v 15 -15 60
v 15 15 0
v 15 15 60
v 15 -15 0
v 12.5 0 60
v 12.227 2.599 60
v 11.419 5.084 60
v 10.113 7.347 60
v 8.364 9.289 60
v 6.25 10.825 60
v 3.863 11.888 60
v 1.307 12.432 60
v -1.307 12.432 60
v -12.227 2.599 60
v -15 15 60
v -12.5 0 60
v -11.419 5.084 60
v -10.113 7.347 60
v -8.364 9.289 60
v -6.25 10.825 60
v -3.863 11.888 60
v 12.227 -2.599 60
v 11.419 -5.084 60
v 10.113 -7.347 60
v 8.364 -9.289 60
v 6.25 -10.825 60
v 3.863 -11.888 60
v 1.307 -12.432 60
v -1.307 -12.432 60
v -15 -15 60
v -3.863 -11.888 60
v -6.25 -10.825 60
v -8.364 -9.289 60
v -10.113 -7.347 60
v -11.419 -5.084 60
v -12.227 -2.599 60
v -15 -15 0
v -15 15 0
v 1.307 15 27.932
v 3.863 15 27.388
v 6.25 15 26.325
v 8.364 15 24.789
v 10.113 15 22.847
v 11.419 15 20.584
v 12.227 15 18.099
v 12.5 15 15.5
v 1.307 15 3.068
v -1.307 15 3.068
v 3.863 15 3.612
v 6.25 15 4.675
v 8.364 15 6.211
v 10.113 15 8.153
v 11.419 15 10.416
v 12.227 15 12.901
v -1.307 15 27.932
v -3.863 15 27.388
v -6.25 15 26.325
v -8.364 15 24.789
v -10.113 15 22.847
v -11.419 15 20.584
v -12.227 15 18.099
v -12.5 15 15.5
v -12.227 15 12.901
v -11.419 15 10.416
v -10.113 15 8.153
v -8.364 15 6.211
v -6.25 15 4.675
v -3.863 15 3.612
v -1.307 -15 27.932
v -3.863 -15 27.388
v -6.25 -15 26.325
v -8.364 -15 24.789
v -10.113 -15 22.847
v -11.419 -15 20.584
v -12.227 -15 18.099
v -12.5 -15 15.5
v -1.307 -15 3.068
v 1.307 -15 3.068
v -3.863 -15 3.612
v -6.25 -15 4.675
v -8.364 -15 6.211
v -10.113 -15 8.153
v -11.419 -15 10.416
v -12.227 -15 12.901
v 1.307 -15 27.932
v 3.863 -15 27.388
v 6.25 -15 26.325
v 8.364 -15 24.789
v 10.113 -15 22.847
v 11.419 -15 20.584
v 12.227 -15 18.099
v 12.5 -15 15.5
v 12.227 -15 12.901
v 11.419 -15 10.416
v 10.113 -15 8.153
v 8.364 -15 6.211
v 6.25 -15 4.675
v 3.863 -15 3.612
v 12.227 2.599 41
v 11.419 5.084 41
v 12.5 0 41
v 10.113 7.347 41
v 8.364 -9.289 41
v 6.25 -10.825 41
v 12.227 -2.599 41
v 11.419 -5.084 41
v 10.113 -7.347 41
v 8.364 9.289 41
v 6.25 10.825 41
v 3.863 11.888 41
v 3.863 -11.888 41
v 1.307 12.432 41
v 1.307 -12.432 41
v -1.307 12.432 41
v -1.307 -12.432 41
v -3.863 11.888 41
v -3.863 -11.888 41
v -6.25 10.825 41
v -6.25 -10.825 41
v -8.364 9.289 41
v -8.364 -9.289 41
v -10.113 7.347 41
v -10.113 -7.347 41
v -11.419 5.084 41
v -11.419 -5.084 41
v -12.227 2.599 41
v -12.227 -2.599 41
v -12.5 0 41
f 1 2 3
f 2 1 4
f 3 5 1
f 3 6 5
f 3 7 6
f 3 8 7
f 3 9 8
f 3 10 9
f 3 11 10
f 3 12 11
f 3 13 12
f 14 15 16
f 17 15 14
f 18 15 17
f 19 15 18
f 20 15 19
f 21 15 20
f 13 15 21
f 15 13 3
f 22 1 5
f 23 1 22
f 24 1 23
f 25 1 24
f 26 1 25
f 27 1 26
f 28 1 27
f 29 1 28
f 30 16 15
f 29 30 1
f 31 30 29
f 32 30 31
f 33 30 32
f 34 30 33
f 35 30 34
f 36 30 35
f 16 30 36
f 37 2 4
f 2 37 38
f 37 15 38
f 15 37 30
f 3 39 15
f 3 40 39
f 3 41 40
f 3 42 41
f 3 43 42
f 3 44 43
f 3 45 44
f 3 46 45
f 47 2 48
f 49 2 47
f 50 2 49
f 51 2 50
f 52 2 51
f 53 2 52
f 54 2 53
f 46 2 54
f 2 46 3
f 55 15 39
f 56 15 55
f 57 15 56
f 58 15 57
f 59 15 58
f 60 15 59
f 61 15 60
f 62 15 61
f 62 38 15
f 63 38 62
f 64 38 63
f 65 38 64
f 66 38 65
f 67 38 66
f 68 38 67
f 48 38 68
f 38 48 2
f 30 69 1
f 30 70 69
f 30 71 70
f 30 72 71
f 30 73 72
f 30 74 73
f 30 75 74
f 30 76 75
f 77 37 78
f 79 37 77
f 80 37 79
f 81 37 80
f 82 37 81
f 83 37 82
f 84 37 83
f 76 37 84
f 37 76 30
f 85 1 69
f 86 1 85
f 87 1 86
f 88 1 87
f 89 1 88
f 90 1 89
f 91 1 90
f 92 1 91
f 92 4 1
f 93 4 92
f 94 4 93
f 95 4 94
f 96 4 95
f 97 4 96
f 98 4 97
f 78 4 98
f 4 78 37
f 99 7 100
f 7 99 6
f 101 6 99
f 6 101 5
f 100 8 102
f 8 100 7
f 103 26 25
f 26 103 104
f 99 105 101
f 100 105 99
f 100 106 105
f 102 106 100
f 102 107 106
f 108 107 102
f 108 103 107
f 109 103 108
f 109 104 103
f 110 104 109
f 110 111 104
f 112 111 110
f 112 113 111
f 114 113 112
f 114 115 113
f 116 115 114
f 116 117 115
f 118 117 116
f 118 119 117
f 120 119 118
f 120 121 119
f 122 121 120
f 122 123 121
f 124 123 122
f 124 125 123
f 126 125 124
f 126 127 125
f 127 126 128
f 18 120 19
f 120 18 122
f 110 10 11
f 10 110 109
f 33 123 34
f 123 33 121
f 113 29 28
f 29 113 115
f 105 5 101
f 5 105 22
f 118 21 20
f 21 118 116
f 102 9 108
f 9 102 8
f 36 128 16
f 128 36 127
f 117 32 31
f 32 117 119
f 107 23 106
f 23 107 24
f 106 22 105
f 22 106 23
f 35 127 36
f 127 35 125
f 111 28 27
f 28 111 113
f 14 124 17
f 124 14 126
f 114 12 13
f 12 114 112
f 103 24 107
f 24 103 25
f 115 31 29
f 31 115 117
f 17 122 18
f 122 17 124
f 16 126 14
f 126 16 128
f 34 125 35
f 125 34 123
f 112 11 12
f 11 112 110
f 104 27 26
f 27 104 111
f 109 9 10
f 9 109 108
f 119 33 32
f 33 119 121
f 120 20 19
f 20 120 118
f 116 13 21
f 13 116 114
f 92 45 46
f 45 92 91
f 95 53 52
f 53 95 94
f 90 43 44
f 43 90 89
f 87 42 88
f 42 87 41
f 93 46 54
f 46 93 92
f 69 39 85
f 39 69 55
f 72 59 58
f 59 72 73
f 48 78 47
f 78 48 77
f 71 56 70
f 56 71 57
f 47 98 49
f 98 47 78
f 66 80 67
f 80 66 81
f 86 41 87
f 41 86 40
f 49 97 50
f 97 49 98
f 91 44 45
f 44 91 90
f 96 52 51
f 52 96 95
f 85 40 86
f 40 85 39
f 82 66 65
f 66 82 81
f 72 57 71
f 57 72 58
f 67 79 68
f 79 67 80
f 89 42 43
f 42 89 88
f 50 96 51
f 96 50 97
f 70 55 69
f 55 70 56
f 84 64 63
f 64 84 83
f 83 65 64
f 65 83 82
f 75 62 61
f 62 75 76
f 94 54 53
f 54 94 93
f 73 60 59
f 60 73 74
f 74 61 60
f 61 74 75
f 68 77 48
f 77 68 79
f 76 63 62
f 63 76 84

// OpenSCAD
// Solar-Bear
// A solar-hybrid trike
// https://github.com/solar-b

// Maker: Mihai Oltean
// https://mihaioltean.github.io
// License: MIT

// last update 2026.09.21
//---------------------------------------------------------------------------------------
module pipe_50_20_2(length)
{
    translate([-25, -10, 0])
        difference(){
            color("DarkSlateGray")
                cube([50, 20, length]);
            translate([2, 2, -2])
            color("DarkSlateGray")
                cube([46, 16, length + 4]);
        }
}
//---------------------------------------------------------------------------------------
module pipe_40_20_2(length)
{
    translate([-20, -10, 0])
        difference(){
            color("DarkSlateGray")
                cube([40, 20, length]);
            translate([2, 2, -2])
            color("DarkSlateGray")
                cube([36, 16, length + 4]);
        }
}
//---------------------------------------------------------------------------------------
module pipe_40_10_1_5(length)
{
    translate([-20, -5, 0])
        difference(){
            color("DarkSlateGray")
                cube([40, 10, length]);
            translate([2, 2, -2])
            color("DarkSlateGray")
                cube([36, 7, length + 4]);
        }
}
//---------------------------------------------------------------------------------------
module pipe_30_20_2(length)
{
    translate([-15, -10, 0])
        difference(){
            color("DarkSlateGray")
                cube([30, 20, length]);
            translate([2, 2, -2])
            color("DarkSlateGray")
                cube([26, 16, length + 4]);
        }
}
//---------------------------------------------------------------------------------------
module pipe_20_20_2(length)
{
    translate([-10, -10, 0])
        difference(){
            color("DarkSlateGray")
                cube([20, 20, length]);
            translate([2, 2, -2])
            color("DarkSlateGray")
                cube([16, 16, length + 4]);
        }
}
//---------------------------------------------------------------------------------------
module pipe_15_15_1_5(length)
{
    translate([-7.5, -7.5, 0])
        difference(){
            color("DarkSlateGray")
                cube([15, 15, length]);
            translate([1.5, 1.5, -2])
            color("DarkSlateGray")
                cube([12, 12, length + 4]);
        }
}
//---------------------------------------------------------------------------------------
module pipe_30_30_2(length)
{
    translate([-15, -15, 0])
        difference(){
            color("DarkSlateGray")
                cube([30, 30, length]);
            translate([2, 2, -2])
            color("DarkSlateGray")
                cube([26, 26, length + 4]);
        }
}
//---------------------------------------------------------------------------------------
module pipe_40_40_2(length)
{
    translate([-20, -20, 0])
        difference(){
            color("DarkSlateGray") cube([40, 40, length]);
            translate([2, 2, -2])
            color("DarkSlateGray")
                cube([36, 36, length + 4]);
        }
}
//---------------------------------------------------------------------------------------
module pipe_40_30_2(length)
{
    translate([-20, -15, 0])
        difference(){
            color("DarkSlateGray") cube([40, 30, length]);
            translate([2, 2, -2])
            color("DarkSlateGray")
                cube([36, 26, length + 4]);
        }
}
//---------------------------------------------------------------------------------------
module cylinder_1_2(length) // 1/2 inches
{
    difference(){
        color("DarkSlateGray")
            cylinder(h= length, r = 10.6);
        translate([0, 0, -2])
        color("DarkSlateGray")
        cylinder(h= length + 4, r = 8.6);
    }
}
//---------------------------------------------------------------------------------------
module corner_30_30_3(length)
{
    difference(){
        color("DarkSlateGray")
            cube([30, length, 30]);
        translate([3, -3, 3])
            color("DarkSlateGray")
                cube([28, length + 6, 28]);
    }
}
//---------------------------------------------------------------------------------------
module corner_30_23_3(length)
{
    difference(){
        color("DarkSlateGray")
            cube([30, length, 23]);
        translate([3, -3, 3])
            color("DarkSlateGray")
                cube([28, length + 6, 21]);
    }
}
//---------------------------------------------------------------------------------------
module corner_23_30_3(length)
{
    difference(){
        color("DarkSlateGray")
            cube([23, length, 30]);
        translate([3, -3, 3])
            color("DarkSlateGray")
                cube([24, length + 6, 28]);
    }
}
//---------------------------------------------------------------------------------------
module corner_25_25_3(length)
{
    difference(){
        color("DarkSlateGray")
            cube([25, length, 25]);
        translate([3, -3, 3])
            color("DarkSlateGray")
                cube([23, length + 6, 23]);
    }
}
//---------------------------------------------------------------------------------------
module corner_40_30_3(length)
{
    difference(){
        color("DarkSlateGray")
            cube([40, length, 30]);
        translate([3, -3, 3])
            color("DarkSlateGray")
                cube([38, length + 6, 28]);
    }
}
//---------------------------------------------------------------------------------------
module corner_40_40_4(length)
{
    difference(){
        color("DarkSlateGray")
            cube([length, 40, 40]);
        translate([-2, 4, 4])
            color("DarkSlateGray")
                cube([length + 4, 40, 40]);
    }
}
//---------------------------------------------------------------------------------------
module corner_angled_40_40_4(length, angle = 90)
{
    color("DarkSlateGray"){
        cube([length, 4, 40]);
        translate([0, 0, 4])
            rotate([-angle, 0, 0])
                cube([length, 4, 40]);
    }
}
//---------------------------------------------------------------------------------------
module T_40_5(length)
{
    difference(){
        color("DarkSlateGray")
            translate([0, -20, 0])
                cube([length, 40, 40]);
                
        translate([-2, -21, 5])
            color("DarkSlateGray")
                cube([length + 4, 18.5, 38]);
                
        translate([-2, 2.5, 5])
            color("DarkSlateGray")
                cube([length + 4, 18.5, 38]);
    }
}
//---------------------------------------------------------------------------------------
module tube(h, r_ext, r_int)
{
    difference(){
        cylinder(h = h, r = r_ext);
        translate([0, 0, -1])
            cylinder(h = h + 2, r = r_int);
    }
}
//---------------------------------------------------------------------------------------
module pipe_connector_25(length)
{// pipe connector, fi 25mm
    difference(){
        translate([-15, -15, 0])
            cube([30, 30, length]);
        translate([0, 0, length - 19])
            cylinder(h = 20, r = 12.5);
        translate([0, 16, 3 + 12.5])
            rotate([90, 0, 0])
                cylinder(h = 32, r = 12.5);
    }
}
//---------------------------------------------------------------------------------------


//corner_50_50_5(100);
//corner_23_30_3(100);

//corner_angled_40_40_4(length = 100, angle = 100);
//tube(h = 100, r_ext = 15, r_int = 12.5);

pipe_connector_25(length = 60);
